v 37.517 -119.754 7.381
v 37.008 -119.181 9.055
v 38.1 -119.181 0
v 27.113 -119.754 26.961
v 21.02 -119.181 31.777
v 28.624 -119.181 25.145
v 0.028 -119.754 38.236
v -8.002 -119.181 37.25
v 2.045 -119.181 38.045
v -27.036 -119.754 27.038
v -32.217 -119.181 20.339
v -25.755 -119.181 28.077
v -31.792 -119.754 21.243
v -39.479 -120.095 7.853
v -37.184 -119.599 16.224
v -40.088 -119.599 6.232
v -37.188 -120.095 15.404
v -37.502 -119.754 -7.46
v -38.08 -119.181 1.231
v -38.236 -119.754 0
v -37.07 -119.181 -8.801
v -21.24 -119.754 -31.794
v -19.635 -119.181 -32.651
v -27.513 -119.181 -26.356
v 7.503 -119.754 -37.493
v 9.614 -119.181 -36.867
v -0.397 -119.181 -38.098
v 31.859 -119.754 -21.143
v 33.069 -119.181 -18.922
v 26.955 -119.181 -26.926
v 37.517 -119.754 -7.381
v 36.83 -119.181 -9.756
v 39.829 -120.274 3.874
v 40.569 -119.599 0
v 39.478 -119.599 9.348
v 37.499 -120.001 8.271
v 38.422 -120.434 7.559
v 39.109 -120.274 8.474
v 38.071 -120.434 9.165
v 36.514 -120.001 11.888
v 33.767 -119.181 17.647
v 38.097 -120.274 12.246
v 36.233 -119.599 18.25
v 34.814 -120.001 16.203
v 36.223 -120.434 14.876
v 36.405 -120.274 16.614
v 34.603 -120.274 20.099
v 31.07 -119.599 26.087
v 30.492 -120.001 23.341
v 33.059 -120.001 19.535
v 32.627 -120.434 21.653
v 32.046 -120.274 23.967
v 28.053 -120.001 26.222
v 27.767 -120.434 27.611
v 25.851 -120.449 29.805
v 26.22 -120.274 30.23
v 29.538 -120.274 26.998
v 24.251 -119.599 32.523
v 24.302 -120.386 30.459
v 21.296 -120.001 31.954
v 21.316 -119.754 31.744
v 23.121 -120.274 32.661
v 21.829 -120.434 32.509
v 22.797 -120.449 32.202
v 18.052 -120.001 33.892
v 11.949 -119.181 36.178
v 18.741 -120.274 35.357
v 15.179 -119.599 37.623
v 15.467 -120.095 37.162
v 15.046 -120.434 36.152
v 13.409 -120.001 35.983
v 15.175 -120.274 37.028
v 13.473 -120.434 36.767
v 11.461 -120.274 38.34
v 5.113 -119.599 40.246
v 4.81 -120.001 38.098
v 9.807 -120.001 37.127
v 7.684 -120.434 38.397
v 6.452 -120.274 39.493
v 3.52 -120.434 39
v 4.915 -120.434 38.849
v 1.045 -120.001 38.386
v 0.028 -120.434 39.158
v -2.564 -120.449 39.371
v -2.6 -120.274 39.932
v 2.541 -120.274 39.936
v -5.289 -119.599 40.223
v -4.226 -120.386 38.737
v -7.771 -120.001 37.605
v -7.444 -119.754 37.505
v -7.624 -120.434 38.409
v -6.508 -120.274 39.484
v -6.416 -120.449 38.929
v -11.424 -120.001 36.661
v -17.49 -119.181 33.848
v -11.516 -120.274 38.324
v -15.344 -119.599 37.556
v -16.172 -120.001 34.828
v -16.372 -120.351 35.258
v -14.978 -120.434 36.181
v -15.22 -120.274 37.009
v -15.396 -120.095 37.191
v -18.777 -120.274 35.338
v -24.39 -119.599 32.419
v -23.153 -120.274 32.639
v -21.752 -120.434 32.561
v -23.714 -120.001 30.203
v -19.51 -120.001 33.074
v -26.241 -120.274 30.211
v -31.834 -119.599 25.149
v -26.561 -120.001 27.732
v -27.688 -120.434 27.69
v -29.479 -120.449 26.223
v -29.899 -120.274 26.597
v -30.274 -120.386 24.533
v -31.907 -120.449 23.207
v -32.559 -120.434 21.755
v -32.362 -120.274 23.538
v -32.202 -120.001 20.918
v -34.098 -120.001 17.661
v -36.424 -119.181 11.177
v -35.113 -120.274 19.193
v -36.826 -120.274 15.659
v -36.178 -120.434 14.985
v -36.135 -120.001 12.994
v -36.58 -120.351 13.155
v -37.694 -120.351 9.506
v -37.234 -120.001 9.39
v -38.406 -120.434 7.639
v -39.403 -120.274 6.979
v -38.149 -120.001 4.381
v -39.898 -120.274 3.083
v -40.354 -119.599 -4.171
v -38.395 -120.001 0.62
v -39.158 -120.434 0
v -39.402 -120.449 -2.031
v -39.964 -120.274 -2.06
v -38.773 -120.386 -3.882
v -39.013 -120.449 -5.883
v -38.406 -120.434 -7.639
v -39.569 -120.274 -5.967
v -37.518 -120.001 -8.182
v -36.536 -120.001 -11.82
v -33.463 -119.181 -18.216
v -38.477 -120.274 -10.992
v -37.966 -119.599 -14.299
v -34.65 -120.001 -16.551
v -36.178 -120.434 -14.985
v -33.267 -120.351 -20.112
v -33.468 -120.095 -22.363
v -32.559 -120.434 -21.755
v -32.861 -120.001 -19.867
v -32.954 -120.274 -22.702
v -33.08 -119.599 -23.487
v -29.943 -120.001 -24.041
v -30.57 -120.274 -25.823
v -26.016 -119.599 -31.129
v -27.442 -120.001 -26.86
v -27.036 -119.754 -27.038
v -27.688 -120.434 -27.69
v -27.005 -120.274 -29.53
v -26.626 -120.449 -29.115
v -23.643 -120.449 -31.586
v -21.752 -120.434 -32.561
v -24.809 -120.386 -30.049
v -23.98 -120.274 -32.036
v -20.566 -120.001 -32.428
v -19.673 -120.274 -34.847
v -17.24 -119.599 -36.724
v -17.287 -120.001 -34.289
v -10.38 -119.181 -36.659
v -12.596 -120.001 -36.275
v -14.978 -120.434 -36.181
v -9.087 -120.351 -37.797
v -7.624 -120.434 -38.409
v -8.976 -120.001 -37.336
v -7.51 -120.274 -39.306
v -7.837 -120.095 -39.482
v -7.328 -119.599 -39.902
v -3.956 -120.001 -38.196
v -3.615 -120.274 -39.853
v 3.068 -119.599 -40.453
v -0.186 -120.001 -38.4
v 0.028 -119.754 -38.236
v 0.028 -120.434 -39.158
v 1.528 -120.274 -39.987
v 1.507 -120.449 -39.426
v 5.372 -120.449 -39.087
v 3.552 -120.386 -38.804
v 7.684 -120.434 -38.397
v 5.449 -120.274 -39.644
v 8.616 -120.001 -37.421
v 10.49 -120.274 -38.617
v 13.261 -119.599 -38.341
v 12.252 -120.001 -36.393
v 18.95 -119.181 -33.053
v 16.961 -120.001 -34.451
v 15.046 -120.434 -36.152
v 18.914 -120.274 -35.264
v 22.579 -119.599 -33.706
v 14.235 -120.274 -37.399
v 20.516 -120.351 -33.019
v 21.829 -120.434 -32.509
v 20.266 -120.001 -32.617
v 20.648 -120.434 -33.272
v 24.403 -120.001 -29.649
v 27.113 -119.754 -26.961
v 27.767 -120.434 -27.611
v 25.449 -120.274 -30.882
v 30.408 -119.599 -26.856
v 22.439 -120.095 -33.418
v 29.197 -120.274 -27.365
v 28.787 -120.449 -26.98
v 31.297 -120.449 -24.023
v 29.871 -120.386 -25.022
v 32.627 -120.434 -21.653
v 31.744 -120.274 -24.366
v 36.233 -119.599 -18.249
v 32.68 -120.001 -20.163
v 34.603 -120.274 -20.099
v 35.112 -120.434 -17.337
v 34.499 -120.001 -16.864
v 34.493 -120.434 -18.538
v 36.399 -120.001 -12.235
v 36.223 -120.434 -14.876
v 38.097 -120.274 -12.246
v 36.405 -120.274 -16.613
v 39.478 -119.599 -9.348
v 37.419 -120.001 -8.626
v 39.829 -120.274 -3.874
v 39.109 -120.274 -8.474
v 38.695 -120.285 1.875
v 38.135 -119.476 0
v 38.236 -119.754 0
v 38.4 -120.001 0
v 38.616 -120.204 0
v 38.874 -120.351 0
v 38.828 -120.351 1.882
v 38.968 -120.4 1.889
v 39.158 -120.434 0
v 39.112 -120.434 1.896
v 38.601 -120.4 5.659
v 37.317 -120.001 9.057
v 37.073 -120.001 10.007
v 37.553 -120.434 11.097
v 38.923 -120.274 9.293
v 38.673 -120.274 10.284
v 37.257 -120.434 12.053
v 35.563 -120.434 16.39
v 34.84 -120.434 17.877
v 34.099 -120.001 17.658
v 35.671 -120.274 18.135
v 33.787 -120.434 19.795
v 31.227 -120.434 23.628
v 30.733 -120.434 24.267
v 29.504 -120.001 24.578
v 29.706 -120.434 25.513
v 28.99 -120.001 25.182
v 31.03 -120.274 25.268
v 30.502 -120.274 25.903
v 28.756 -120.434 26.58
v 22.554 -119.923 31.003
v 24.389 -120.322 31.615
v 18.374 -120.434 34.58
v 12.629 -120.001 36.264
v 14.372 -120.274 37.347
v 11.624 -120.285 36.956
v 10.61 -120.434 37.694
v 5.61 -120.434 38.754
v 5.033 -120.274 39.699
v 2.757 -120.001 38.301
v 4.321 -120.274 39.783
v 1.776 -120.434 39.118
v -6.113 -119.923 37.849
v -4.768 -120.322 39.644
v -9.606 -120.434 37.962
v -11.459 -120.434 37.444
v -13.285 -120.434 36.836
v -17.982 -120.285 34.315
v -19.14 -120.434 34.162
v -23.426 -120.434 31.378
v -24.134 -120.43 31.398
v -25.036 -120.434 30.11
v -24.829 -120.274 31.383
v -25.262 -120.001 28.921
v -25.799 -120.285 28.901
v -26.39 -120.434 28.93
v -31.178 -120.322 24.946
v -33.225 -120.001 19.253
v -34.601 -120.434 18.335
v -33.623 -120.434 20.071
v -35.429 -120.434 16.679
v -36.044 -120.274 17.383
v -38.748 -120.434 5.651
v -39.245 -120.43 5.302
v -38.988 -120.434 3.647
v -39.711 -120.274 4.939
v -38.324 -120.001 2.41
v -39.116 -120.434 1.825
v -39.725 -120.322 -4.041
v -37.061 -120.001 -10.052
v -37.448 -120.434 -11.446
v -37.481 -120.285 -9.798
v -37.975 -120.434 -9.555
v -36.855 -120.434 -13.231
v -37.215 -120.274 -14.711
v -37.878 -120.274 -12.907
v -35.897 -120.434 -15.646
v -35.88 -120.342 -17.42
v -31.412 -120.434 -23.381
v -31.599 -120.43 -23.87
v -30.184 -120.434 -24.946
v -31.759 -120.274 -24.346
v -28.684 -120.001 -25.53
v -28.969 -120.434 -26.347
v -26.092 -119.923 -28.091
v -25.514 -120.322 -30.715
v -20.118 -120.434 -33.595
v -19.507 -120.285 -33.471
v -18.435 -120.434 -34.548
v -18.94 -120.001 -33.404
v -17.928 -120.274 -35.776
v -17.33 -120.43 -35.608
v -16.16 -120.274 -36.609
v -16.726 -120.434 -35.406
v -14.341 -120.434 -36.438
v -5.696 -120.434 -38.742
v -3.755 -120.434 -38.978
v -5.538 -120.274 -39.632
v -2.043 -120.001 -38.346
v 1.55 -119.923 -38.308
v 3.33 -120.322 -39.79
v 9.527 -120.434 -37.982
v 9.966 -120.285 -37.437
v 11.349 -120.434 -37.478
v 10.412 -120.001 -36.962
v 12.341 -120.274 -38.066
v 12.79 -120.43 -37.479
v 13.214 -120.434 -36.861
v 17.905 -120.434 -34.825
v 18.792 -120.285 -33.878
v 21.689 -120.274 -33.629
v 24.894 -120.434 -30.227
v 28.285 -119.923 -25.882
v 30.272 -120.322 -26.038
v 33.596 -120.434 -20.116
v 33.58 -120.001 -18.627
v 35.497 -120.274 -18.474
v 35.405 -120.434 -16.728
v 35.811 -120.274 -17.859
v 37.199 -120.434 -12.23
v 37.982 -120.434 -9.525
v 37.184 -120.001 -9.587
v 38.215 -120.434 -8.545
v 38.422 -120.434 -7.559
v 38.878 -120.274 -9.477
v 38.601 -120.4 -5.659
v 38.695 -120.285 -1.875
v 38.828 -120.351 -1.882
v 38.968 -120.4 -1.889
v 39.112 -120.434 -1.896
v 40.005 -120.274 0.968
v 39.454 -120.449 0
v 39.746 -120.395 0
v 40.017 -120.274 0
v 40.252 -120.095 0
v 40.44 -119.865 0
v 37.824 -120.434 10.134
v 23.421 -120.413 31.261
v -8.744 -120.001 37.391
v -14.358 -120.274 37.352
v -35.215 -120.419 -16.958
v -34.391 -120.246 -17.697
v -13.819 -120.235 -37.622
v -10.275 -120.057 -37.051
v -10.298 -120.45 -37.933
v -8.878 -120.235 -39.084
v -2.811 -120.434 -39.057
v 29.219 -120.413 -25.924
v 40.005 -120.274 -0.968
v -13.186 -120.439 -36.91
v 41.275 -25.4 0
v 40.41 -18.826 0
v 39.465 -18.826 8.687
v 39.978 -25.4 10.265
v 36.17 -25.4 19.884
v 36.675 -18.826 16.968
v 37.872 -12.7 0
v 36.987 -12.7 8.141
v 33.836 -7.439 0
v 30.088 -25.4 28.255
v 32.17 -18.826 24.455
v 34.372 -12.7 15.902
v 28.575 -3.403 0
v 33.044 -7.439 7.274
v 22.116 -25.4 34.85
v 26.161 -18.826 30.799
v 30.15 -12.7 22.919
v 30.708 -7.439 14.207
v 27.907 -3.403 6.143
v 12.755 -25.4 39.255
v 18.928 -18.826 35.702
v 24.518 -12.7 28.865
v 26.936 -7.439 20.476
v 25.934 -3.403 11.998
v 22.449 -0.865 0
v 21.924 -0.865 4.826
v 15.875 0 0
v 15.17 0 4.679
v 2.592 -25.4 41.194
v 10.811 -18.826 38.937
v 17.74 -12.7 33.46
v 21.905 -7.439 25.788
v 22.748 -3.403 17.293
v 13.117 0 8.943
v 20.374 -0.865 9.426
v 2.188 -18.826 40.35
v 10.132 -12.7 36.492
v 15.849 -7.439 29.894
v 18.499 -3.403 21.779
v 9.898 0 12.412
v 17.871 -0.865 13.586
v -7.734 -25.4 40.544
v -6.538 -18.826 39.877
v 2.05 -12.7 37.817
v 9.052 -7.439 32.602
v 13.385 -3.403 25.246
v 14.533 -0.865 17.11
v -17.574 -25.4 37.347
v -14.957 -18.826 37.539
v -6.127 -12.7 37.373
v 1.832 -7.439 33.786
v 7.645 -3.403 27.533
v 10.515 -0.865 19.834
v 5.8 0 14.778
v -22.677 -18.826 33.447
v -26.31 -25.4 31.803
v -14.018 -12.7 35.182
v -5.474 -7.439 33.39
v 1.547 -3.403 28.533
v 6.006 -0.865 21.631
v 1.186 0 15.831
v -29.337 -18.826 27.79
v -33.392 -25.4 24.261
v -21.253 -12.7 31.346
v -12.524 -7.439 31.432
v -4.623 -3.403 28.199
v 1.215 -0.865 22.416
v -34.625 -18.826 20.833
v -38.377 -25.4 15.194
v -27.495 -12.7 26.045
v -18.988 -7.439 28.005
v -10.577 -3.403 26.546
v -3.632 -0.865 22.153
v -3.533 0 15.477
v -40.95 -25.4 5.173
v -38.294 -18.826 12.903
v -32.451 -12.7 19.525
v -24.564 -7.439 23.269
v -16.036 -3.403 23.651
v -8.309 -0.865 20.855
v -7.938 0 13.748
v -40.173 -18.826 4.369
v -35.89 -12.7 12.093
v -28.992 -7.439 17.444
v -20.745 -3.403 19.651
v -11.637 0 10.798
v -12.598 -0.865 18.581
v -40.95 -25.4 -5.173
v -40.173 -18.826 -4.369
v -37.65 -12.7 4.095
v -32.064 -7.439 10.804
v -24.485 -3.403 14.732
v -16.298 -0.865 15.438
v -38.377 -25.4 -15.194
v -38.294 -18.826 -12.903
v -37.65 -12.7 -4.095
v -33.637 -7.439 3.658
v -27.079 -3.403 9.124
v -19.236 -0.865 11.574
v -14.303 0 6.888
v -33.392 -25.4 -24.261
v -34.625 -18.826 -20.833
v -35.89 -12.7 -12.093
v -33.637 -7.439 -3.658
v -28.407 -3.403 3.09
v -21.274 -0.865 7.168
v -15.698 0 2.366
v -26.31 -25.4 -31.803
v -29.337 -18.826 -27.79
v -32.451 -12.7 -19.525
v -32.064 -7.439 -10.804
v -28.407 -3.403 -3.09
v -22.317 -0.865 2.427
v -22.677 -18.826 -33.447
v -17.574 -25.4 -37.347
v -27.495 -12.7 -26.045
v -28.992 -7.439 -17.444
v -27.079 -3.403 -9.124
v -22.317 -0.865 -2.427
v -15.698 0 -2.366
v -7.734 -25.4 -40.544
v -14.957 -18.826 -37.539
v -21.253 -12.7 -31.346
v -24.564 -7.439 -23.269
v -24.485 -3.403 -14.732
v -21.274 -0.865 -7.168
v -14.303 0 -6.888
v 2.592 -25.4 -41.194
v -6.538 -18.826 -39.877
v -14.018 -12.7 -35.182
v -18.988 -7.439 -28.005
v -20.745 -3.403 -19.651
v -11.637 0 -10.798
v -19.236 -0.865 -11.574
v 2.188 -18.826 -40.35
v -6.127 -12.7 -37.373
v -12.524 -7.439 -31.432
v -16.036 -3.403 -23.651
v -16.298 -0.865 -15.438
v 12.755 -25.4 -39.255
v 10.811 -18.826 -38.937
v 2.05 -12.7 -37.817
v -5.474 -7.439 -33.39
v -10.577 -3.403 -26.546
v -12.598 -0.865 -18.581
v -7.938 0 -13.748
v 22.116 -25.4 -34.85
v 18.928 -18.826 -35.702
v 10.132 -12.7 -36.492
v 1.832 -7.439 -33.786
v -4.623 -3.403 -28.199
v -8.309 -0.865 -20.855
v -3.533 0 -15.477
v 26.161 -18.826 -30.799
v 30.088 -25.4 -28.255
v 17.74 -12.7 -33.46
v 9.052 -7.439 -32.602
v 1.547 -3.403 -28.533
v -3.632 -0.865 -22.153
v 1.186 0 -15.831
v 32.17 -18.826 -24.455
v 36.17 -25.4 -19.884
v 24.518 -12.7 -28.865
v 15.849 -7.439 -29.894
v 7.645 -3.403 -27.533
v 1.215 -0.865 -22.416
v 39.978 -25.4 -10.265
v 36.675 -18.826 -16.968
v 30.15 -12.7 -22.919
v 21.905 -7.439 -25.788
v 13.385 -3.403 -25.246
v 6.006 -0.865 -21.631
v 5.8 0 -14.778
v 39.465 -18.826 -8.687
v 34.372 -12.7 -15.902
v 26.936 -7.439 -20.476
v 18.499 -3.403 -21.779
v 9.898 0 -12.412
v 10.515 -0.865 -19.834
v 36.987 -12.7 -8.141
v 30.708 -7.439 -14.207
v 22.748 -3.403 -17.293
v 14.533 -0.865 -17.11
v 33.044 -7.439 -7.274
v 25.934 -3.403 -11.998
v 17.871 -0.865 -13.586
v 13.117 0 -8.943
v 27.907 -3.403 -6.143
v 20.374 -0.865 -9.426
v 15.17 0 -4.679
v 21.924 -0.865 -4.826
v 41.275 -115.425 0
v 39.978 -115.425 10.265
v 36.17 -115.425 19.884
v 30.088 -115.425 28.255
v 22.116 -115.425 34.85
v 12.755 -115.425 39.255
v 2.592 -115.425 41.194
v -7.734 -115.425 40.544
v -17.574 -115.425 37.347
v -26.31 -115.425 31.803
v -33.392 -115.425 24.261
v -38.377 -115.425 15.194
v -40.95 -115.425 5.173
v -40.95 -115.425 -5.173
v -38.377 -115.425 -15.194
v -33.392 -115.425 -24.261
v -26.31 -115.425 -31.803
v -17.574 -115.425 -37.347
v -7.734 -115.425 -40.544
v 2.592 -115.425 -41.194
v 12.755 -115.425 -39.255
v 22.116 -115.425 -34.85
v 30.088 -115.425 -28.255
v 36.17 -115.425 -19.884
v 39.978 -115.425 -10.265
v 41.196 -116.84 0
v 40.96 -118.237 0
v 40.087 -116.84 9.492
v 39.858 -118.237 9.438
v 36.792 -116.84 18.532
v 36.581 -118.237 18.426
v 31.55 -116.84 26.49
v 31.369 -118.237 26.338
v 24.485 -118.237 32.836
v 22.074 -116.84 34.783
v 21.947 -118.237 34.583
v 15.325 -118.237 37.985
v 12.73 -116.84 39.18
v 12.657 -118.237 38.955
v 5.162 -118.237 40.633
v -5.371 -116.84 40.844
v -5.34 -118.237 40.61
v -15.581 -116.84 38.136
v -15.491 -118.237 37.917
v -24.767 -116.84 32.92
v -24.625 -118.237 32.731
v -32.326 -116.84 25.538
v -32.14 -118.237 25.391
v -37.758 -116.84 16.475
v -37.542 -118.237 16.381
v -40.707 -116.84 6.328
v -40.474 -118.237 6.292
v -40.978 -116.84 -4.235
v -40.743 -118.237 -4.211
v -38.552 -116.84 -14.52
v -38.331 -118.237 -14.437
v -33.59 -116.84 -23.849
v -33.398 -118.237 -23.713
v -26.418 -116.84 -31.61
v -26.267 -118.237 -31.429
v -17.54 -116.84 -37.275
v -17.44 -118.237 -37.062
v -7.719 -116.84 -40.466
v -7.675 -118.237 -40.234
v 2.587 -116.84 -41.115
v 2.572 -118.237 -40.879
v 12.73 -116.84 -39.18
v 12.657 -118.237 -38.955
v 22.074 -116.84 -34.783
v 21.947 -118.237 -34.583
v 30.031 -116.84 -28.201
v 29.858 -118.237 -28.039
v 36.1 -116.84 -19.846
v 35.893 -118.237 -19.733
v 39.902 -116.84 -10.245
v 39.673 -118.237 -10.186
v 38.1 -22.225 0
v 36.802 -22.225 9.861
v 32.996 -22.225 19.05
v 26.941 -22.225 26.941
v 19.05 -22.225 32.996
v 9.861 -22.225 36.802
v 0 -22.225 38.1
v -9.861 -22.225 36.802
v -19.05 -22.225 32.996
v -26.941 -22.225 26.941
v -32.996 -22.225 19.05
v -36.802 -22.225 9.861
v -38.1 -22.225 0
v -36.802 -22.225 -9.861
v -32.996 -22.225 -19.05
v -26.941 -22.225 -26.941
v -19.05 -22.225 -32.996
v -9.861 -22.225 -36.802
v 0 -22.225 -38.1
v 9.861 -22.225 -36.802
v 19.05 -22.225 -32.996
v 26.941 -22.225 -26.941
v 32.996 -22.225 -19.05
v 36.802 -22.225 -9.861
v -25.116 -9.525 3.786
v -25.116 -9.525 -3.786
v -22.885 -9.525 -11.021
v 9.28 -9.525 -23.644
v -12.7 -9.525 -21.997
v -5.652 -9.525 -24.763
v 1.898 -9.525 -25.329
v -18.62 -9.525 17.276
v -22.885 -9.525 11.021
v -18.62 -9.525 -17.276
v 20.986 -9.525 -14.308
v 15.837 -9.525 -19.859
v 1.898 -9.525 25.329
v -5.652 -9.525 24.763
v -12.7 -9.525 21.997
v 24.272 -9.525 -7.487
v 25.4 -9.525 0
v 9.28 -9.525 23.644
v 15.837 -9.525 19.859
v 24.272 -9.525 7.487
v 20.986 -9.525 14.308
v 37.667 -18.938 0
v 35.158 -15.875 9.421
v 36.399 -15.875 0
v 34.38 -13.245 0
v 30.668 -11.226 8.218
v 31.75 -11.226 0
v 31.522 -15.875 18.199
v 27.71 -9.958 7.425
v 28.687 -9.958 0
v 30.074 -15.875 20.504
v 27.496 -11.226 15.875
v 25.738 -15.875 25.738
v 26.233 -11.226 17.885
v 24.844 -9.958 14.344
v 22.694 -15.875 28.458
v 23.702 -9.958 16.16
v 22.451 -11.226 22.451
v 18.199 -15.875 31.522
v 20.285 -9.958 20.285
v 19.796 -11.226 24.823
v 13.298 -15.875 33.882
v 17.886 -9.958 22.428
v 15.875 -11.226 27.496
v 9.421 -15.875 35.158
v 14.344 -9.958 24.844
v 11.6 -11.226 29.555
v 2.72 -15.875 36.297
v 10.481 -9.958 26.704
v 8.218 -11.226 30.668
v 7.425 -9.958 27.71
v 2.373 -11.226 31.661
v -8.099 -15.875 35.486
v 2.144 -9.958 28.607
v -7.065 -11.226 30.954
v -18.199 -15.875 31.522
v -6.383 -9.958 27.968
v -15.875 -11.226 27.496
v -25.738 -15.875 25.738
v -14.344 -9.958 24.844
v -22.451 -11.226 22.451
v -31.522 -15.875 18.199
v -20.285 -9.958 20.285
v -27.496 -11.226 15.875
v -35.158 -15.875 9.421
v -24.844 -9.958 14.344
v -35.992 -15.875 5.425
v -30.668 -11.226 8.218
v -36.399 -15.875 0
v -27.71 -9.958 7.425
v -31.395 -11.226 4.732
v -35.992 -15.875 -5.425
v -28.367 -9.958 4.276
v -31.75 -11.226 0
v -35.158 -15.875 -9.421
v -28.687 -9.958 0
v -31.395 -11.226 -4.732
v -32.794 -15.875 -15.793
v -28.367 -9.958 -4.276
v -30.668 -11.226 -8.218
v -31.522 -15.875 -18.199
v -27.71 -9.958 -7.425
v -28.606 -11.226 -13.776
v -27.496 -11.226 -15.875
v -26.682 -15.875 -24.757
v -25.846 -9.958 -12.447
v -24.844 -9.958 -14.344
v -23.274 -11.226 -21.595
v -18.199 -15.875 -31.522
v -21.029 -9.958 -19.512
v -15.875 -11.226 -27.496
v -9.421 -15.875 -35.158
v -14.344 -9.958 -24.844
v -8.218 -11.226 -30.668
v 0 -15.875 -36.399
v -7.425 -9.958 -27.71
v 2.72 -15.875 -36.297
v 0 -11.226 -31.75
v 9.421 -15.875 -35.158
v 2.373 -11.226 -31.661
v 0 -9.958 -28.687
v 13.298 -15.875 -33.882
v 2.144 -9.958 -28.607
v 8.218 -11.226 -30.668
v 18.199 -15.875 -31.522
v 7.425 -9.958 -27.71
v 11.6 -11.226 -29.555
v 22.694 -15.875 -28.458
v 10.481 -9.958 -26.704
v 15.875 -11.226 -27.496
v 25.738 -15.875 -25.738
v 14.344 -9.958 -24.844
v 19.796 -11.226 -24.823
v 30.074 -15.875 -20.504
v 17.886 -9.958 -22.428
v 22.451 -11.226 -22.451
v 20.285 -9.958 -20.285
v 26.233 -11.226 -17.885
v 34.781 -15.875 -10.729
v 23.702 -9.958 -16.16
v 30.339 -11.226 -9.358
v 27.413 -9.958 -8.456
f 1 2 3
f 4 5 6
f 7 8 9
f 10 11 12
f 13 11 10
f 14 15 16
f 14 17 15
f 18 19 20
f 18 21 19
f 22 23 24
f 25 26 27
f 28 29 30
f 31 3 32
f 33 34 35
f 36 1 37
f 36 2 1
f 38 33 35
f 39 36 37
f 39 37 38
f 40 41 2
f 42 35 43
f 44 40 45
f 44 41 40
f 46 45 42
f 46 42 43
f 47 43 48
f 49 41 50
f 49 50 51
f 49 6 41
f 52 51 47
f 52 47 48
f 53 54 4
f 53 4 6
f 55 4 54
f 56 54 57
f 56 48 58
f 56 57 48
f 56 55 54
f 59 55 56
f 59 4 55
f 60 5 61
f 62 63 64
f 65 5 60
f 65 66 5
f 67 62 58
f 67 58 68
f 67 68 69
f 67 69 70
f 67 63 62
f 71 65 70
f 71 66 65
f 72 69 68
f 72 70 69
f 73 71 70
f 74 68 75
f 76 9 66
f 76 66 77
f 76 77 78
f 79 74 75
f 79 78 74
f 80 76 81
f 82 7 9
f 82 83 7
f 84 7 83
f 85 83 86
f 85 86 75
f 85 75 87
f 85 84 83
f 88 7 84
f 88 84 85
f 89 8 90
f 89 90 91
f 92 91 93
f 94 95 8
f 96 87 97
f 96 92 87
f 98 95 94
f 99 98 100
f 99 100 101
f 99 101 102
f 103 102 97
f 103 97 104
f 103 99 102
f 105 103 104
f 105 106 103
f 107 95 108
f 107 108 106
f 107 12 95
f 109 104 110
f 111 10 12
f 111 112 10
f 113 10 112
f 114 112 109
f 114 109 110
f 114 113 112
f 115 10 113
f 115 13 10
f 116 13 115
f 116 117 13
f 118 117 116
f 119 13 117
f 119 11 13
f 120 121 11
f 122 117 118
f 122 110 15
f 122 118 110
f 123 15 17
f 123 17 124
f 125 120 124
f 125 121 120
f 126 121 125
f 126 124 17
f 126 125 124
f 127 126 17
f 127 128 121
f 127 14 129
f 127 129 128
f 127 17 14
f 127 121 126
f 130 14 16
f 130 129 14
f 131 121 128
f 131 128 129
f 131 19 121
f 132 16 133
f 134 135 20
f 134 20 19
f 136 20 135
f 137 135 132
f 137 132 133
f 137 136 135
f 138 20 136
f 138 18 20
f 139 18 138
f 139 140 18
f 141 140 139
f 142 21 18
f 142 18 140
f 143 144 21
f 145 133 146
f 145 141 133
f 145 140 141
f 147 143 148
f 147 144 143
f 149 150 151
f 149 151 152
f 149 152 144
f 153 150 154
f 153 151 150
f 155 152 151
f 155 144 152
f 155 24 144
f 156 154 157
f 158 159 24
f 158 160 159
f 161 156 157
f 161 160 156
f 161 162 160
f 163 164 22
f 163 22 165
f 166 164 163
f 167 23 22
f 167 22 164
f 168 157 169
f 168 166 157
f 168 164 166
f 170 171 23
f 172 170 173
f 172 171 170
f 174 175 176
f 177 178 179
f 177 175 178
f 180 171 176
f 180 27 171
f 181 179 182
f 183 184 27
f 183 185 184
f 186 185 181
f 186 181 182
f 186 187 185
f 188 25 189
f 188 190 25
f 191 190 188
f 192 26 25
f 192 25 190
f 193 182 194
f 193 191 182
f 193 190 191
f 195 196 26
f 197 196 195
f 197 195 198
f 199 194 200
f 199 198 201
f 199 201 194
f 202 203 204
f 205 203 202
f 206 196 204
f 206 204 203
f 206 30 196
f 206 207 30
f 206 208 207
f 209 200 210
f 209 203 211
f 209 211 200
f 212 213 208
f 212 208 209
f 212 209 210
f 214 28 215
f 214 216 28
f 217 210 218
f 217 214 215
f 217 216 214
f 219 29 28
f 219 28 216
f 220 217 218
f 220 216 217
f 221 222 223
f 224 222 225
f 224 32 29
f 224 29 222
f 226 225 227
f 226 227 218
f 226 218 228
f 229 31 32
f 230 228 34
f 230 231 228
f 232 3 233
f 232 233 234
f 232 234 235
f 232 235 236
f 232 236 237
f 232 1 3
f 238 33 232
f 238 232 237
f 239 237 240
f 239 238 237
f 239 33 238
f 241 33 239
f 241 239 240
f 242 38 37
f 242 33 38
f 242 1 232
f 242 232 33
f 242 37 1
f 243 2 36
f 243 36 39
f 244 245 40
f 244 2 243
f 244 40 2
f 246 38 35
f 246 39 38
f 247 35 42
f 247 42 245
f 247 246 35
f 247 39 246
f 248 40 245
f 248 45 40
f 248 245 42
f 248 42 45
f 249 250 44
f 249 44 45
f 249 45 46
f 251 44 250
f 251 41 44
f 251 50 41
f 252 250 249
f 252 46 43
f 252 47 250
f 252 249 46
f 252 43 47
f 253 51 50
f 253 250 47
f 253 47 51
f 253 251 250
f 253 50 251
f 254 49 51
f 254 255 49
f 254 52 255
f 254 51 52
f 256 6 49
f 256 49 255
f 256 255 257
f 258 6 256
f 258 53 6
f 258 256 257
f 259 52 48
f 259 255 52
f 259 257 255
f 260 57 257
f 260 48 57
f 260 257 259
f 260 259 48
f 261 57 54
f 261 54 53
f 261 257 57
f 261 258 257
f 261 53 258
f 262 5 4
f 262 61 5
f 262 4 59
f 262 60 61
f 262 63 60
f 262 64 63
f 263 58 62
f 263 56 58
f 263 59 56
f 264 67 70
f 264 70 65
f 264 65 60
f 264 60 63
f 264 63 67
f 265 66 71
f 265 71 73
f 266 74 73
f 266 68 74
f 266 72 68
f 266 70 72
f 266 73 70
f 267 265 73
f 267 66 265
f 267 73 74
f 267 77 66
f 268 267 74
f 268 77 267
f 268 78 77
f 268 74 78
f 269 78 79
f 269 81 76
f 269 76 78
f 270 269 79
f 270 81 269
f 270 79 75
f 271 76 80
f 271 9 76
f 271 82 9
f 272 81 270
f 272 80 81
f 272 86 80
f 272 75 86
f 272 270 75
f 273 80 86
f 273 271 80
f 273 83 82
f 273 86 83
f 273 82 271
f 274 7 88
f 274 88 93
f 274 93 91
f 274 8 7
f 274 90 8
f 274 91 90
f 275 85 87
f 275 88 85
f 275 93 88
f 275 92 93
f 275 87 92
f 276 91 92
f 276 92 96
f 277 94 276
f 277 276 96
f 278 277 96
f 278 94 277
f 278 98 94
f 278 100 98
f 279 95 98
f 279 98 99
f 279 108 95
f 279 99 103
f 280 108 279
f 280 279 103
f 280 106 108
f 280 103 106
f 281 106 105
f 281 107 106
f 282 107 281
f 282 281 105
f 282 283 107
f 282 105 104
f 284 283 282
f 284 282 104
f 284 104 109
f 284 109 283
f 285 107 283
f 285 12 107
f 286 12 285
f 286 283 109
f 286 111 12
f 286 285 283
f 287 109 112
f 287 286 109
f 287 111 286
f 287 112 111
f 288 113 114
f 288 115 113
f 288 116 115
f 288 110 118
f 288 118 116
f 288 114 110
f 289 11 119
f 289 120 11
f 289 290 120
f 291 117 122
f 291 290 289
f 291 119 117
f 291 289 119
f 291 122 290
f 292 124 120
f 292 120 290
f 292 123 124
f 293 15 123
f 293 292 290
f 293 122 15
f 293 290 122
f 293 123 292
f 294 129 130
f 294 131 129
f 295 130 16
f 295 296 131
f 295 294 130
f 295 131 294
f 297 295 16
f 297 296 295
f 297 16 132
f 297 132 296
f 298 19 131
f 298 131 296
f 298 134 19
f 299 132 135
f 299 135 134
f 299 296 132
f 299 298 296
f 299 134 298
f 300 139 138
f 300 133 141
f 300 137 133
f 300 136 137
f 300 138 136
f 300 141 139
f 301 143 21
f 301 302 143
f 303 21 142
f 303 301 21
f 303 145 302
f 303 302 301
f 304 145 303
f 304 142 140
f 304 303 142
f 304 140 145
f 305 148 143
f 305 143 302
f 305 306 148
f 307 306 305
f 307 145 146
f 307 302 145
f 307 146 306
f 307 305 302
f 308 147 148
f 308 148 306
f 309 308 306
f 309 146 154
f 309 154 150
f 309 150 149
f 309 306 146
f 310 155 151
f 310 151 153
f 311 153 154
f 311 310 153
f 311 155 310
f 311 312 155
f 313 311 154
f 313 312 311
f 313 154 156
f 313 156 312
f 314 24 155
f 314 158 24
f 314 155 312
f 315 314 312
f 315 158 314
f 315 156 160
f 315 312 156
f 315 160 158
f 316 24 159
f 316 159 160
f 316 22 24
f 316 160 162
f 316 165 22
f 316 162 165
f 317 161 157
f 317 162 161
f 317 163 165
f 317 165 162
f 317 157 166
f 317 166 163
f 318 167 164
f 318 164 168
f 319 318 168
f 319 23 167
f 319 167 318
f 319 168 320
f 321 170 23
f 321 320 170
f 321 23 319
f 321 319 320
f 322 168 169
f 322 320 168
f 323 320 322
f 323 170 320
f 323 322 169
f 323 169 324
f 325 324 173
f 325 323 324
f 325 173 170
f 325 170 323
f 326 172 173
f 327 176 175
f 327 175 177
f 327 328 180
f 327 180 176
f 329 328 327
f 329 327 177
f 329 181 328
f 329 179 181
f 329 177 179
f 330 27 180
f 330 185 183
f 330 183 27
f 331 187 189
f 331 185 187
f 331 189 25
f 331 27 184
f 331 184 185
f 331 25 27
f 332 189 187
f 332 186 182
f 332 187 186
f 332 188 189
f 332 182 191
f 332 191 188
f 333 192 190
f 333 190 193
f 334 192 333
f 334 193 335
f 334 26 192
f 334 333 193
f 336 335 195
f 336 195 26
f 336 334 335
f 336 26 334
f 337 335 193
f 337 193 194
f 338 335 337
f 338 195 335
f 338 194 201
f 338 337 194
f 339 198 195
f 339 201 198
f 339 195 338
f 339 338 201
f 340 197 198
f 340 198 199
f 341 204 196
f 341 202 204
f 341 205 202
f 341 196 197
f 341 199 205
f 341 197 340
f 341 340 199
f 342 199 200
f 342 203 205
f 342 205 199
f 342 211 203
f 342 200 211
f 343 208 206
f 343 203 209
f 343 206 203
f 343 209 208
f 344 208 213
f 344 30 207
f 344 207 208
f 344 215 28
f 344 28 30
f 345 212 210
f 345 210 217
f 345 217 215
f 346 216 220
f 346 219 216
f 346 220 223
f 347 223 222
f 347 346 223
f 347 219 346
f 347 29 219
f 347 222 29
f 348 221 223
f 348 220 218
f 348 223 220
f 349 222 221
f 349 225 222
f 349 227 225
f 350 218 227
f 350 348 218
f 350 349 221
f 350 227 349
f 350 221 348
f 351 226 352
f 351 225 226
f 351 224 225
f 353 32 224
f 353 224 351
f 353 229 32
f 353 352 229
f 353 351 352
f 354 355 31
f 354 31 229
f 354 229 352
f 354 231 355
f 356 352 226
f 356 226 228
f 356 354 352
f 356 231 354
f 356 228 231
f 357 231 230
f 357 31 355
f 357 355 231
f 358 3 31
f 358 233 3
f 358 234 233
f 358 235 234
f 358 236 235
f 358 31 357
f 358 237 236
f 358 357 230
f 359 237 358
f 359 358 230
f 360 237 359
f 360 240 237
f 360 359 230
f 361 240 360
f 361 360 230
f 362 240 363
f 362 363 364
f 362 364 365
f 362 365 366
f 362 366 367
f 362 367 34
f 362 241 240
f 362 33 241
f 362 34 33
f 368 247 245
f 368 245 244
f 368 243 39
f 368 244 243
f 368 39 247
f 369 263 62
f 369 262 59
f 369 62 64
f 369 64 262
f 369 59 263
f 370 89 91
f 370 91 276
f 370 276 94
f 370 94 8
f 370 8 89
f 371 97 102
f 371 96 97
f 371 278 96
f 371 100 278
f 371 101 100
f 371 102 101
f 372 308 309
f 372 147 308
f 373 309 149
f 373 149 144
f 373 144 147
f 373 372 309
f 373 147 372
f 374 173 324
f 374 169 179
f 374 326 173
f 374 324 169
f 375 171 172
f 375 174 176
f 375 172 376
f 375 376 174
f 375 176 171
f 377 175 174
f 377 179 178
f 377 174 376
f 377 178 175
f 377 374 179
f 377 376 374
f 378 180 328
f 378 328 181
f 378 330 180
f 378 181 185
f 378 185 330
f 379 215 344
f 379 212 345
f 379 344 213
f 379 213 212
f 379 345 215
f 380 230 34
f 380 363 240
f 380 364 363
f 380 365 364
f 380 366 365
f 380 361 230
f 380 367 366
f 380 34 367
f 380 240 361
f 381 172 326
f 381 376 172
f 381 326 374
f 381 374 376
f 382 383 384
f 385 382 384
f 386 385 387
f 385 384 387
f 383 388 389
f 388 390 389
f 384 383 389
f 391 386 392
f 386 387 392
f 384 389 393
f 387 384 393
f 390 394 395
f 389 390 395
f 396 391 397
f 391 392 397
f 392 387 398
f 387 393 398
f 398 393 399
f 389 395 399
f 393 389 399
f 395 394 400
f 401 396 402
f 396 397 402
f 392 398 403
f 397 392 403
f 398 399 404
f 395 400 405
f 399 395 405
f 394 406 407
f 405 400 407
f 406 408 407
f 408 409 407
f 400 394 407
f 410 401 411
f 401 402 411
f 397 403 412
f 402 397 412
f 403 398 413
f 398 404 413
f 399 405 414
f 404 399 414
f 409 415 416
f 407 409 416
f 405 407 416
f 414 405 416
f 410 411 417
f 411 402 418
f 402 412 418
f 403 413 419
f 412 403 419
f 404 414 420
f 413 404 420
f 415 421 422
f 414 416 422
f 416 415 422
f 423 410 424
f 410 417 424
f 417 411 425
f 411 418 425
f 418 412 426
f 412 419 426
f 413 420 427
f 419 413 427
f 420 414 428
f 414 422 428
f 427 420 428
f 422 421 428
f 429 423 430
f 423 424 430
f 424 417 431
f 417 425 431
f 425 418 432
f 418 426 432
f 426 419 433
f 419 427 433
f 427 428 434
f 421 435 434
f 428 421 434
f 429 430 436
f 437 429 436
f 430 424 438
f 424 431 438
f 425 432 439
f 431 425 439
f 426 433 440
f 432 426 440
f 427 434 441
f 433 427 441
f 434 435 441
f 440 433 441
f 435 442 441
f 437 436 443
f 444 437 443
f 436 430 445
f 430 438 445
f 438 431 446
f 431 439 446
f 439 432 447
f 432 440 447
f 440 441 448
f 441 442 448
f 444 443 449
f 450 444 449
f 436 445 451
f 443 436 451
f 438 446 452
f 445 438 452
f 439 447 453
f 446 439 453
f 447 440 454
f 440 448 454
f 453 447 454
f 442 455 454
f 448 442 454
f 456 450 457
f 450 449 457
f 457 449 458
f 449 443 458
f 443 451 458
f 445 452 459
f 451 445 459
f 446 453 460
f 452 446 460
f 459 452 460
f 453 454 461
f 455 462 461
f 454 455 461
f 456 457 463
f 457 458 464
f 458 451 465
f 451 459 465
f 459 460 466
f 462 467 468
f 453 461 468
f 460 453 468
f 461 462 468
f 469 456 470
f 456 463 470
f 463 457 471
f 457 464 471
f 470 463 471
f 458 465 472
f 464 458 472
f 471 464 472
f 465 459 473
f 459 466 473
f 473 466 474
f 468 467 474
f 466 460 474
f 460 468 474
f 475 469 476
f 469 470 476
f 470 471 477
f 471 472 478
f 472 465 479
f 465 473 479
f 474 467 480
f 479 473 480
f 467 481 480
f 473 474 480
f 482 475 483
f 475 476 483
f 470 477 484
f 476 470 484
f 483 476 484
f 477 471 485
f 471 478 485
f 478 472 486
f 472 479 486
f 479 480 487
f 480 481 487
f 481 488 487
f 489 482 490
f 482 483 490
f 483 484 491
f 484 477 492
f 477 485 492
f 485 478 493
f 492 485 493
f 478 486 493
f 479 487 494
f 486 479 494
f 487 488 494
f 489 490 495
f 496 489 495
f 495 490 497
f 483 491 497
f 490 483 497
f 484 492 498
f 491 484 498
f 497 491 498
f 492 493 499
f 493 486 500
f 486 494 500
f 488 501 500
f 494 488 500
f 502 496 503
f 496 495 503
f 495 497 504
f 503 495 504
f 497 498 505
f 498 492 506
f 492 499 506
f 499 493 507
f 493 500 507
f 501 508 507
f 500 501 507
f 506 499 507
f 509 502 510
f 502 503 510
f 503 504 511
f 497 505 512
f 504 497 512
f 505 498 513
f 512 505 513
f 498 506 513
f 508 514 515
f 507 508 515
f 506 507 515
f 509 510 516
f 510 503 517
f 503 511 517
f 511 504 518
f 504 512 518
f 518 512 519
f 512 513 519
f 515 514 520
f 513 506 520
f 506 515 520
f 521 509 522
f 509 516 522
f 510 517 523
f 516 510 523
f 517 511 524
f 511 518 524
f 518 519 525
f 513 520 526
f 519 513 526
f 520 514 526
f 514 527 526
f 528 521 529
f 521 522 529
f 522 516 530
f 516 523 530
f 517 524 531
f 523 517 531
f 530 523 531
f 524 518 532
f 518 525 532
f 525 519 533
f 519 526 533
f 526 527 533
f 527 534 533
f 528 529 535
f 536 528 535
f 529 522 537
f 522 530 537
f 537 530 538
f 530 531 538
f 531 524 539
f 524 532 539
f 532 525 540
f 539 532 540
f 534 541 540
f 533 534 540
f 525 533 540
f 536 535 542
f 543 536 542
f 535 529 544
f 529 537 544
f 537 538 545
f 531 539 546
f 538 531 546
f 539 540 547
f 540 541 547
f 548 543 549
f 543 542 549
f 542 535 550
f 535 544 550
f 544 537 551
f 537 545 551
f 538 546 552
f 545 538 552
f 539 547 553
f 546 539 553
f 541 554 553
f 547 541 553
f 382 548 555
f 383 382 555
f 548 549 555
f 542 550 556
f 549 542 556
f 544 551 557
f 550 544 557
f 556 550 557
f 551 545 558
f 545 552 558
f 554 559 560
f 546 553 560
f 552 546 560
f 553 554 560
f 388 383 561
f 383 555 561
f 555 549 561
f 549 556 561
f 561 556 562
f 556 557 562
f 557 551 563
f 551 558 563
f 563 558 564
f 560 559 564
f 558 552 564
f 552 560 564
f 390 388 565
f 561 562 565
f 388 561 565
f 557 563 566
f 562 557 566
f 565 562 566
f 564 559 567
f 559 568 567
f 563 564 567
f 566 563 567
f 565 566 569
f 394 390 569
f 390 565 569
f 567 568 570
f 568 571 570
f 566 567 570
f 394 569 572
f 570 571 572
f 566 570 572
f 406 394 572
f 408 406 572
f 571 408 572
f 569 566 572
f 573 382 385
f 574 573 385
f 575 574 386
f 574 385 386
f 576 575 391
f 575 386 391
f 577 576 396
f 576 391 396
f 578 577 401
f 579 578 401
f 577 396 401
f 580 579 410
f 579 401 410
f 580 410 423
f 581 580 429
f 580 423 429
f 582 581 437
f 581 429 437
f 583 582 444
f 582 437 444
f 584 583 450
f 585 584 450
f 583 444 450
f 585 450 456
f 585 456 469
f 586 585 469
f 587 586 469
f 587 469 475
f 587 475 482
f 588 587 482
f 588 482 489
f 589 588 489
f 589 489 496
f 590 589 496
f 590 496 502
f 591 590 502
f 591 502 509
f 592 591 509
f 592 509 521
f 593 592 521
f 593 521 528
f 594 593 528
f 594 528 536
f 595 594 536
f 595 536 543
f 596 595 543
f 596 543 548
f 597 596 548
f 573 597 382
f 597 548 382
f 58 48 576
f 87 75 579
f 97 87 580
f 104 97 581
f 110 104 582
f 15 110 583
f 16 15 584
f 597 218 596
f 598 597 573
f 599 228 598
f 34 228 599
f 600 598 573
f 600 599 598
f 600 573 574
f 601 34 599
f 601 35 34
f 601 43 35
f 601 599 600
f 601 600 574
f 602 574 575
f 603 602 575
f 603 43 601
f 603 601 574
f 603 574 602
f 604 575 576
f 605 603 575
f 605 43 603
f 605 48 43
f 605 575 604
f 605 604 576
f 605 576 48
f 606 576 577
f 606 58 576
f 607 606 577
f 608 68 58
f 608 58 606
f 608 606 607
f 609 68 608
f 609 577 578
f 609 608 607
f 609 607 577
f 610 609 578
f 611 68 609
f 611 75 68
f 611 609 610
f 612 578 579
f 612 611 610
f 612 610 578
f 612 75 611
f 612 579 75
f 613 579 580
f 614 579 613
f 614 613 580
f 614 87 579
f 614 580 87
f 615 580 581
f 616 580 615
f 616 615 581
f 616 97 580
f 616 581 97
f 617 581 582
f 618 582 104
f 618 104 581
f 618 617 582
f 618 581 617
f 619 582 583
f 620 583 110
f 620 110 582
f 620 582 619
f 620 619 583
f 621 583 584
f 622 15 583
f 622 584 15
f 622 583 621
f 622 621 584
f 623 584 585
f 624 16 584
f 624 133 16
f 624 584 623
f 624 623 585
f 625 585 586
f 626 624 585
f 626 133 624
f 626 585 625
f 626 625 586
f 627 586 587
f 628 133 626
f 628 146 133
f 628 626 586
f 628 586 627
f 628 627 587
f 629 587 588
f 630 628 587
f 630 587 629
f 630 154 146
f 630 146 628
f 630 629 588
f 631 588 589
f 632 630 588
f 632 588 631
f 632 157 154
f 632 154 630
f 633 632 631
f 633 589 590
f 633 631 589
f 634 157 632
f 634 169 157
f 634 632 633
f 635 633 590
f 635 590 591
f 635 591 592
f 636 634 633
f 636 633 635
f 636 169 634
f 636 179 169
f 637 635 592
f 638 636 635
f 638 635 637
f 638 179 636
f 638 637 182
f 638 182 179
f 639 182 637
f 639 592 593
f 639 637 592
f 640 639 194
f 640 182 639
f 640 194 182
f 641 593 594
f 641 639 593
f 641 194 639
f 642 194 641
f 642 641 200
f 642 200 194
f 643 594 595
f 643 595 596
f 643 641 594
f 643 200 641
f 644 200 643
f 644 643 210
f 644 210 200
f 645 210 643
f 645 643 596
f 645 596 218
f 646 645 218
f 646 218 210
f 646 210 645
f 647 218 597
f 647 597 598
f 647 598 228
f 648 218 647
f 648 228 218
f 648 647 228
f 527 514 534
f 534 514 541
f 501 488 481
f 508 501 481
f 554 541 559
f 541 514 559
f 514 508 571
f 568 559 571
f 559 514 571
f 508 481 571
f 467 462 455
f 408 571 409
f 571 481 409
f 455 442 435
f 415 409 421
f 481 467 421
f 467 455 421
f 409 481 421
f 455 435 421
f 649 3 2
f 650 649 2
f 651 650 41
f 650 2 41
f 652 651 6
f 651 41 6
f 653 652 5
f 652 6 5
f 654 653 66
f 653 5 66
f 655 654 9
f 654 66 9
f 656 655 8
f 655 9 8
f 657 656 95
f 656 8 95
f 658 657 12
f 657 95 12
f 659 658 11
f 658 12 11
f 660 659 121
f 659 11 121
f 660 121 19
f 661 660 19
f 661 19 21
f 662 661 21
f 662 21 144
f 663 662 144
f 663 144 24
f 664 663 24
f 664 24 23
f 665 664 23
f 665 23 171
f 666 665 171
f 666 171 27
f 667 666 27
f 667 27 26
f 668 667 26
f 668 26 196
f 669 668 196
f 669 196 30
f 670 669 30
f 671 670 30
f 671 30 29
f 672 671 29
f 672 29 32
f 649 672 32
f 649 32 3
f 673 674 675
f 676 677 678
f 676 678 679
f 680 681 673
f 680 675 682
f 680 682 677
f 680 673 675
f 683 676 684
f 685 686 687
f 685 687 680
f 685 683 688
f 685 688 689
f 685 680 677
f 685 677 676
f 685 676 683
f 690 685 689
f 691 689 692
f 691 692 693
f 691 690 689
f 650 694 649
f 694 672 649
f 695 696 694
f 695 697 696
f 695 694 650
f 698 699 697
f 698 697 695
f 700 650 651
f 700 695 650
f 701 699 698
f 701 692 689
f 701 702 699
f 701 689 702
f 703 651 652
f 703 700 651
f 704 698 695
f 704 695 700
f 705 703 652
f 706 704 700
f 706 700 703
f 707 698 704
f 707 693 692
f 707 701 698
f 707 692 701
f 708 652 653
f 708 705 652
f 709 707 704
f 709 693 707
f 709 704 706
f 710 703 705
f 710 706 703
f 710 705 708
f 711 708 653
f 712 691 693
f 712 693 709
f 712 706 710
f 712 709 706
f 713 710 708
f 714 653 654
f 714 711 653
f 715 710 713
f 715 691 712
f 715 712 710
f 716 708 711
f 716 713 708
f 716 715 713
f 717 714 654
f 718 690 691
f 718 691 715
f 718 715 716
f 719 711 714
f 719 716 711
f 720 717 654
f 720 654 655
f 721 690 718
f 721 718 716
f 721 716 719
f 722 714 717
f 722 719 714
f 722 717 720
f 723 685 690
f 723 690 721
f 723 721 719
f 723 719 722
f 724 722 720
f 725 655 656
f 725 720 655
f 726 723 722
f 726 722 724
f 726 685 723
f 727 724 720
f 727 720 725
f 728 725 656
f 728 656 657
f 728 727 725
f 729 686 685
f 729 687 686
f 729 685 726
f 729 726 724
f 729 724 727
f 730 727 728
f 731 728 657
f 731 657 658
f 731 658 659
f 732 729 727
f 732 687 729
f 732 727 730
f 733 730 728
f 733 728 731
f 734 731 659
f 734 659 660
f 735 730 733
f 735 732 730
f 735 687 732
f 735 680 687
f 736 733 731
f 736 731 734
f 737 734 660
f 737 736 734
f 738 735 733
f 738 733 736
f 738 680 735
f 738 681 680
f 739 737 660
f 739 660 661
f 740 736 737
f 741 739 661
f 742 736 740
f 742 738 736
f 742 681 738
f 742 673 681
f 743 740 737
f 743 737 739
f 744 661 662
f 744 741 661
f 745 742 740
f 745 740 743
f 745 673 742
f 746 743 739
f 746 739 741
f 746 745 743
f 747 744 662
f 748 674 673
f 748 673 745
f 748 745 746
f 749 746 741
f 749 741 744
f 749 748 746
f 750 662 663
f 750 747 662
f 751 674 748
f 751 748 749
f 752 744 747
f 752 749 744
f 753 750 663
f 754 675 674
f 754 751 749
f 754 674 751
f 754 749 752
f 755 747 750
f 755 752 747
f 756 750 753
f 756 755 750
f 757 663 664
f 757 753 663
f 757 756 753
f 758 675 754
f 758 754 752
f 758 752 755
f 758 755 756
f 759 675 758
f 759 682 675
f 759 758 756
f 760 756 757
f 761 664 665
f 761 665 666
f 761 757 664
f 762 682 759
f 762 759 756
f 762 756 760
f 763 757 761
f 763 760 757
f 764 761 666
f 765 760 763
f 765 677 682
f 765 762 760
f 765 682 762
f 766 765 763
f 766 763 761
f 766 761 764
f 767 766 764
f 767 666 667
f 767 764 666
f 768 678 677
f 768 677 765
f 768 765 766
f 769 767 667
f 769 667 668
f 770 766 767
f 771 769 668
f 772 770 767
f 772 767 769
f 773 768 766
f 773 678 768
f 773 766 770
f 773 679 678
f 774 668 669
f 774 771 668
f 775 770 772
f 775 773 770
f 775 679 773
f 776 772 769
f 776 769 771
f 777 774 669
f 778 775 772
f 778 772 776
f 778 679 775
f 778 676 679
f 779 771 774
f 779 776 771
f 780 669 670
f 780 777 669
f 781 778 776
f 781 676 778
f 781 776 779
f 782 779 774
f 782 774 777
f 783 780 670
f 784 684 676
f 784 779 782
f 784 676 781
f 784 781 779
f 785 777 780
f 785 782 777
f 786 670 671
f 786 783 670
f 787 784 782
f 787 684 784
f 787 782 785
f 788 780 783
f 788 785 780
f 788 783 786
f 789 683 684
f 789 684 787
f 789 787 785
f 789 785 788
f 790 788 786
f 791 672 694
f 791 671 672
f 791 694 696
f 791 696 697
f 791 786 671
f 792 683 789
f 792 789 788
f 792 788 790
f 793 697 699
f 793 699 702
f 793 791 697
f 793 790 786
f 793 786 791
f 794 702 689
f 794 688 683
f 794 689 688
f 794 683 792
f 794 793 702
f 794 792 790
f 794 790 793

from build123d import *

# Parameters (mm, degrees)
F0_R     = 41.275
F1_DEPTH = 123.825
F2_R     = 38.1
F3_DEPTH = 114.3
F5_R     = 1.27
F6_R     = 25.4


# Not quite as in the source:
# - a fillet or chamfer that OpenCascade refuses, or shapes differently, is made with other operations: its cross-section is extruded or revolved along the edge and cut away or added


with BuildPart() as f1:
    # F0 (on Front) → F1 (new body)
    with BuildSketch(Plane.XZ):
        Circle(F0_R)
    extrude(amount=F1_DEPTH)

    # F2 (on face) → F3 (cut)
    with BuildSketch(Plane.XZ.offset(123.825)):
        Circle(F2_R)
    extrude(amount=-F3_DEPTH, mode=Mode.SUBTRACT)

    # F4: fillet of radius 12.7 on 2 edges, made by hand

    # F4_s1 → F4_t2 (revolve)
    with BuildSketch(Plane.XY):
        with BuildLine():
            ThreePointArc((38.1, -22.225), (34.3802561211, -13.2447438789), (25.4, -9.525))
            Line((25.4, -9.525), (38.1, -9.525))
            Line((38.1, -9.525), (38.1, -22.225))
        make_face()
    revolve(axis=Axis((0, -9.525, 0), (0, -1, 0)))

    # F4_s3 → F4_t4 (revolve, cut)
    with BuildSketch(Plane.XY):
        with BuildLine():
            ThreePointArc((41.275, -115.4247395874), (40.454762203, -119.9148676479), (38.1, -123.825))
            Line((38.1, -123.825), (41.275, -123.825))
            Line((41.275, -123.825), (41.275, -115.4247395874))
        make_face()
    revolve(axis=Axis((0, -123.825, 0), (0, -1, 0)), mode=Mode.SUBTRACT)

    # F5
    f5_edges = [f1.edges().sort_by_distance(p)[0] for p in [
        (-38.1, -123.825, 0),
    ]]
    fillet(f5_edges, radius=F5_R)

    # F6
    f6_edges = [f1.edges().sort_by_distance(p)[0] for p in [
        (-41.275, 0, 0),
    ]]
    fillet(f6_edges, radius=F6_R)


solid = f1.part
